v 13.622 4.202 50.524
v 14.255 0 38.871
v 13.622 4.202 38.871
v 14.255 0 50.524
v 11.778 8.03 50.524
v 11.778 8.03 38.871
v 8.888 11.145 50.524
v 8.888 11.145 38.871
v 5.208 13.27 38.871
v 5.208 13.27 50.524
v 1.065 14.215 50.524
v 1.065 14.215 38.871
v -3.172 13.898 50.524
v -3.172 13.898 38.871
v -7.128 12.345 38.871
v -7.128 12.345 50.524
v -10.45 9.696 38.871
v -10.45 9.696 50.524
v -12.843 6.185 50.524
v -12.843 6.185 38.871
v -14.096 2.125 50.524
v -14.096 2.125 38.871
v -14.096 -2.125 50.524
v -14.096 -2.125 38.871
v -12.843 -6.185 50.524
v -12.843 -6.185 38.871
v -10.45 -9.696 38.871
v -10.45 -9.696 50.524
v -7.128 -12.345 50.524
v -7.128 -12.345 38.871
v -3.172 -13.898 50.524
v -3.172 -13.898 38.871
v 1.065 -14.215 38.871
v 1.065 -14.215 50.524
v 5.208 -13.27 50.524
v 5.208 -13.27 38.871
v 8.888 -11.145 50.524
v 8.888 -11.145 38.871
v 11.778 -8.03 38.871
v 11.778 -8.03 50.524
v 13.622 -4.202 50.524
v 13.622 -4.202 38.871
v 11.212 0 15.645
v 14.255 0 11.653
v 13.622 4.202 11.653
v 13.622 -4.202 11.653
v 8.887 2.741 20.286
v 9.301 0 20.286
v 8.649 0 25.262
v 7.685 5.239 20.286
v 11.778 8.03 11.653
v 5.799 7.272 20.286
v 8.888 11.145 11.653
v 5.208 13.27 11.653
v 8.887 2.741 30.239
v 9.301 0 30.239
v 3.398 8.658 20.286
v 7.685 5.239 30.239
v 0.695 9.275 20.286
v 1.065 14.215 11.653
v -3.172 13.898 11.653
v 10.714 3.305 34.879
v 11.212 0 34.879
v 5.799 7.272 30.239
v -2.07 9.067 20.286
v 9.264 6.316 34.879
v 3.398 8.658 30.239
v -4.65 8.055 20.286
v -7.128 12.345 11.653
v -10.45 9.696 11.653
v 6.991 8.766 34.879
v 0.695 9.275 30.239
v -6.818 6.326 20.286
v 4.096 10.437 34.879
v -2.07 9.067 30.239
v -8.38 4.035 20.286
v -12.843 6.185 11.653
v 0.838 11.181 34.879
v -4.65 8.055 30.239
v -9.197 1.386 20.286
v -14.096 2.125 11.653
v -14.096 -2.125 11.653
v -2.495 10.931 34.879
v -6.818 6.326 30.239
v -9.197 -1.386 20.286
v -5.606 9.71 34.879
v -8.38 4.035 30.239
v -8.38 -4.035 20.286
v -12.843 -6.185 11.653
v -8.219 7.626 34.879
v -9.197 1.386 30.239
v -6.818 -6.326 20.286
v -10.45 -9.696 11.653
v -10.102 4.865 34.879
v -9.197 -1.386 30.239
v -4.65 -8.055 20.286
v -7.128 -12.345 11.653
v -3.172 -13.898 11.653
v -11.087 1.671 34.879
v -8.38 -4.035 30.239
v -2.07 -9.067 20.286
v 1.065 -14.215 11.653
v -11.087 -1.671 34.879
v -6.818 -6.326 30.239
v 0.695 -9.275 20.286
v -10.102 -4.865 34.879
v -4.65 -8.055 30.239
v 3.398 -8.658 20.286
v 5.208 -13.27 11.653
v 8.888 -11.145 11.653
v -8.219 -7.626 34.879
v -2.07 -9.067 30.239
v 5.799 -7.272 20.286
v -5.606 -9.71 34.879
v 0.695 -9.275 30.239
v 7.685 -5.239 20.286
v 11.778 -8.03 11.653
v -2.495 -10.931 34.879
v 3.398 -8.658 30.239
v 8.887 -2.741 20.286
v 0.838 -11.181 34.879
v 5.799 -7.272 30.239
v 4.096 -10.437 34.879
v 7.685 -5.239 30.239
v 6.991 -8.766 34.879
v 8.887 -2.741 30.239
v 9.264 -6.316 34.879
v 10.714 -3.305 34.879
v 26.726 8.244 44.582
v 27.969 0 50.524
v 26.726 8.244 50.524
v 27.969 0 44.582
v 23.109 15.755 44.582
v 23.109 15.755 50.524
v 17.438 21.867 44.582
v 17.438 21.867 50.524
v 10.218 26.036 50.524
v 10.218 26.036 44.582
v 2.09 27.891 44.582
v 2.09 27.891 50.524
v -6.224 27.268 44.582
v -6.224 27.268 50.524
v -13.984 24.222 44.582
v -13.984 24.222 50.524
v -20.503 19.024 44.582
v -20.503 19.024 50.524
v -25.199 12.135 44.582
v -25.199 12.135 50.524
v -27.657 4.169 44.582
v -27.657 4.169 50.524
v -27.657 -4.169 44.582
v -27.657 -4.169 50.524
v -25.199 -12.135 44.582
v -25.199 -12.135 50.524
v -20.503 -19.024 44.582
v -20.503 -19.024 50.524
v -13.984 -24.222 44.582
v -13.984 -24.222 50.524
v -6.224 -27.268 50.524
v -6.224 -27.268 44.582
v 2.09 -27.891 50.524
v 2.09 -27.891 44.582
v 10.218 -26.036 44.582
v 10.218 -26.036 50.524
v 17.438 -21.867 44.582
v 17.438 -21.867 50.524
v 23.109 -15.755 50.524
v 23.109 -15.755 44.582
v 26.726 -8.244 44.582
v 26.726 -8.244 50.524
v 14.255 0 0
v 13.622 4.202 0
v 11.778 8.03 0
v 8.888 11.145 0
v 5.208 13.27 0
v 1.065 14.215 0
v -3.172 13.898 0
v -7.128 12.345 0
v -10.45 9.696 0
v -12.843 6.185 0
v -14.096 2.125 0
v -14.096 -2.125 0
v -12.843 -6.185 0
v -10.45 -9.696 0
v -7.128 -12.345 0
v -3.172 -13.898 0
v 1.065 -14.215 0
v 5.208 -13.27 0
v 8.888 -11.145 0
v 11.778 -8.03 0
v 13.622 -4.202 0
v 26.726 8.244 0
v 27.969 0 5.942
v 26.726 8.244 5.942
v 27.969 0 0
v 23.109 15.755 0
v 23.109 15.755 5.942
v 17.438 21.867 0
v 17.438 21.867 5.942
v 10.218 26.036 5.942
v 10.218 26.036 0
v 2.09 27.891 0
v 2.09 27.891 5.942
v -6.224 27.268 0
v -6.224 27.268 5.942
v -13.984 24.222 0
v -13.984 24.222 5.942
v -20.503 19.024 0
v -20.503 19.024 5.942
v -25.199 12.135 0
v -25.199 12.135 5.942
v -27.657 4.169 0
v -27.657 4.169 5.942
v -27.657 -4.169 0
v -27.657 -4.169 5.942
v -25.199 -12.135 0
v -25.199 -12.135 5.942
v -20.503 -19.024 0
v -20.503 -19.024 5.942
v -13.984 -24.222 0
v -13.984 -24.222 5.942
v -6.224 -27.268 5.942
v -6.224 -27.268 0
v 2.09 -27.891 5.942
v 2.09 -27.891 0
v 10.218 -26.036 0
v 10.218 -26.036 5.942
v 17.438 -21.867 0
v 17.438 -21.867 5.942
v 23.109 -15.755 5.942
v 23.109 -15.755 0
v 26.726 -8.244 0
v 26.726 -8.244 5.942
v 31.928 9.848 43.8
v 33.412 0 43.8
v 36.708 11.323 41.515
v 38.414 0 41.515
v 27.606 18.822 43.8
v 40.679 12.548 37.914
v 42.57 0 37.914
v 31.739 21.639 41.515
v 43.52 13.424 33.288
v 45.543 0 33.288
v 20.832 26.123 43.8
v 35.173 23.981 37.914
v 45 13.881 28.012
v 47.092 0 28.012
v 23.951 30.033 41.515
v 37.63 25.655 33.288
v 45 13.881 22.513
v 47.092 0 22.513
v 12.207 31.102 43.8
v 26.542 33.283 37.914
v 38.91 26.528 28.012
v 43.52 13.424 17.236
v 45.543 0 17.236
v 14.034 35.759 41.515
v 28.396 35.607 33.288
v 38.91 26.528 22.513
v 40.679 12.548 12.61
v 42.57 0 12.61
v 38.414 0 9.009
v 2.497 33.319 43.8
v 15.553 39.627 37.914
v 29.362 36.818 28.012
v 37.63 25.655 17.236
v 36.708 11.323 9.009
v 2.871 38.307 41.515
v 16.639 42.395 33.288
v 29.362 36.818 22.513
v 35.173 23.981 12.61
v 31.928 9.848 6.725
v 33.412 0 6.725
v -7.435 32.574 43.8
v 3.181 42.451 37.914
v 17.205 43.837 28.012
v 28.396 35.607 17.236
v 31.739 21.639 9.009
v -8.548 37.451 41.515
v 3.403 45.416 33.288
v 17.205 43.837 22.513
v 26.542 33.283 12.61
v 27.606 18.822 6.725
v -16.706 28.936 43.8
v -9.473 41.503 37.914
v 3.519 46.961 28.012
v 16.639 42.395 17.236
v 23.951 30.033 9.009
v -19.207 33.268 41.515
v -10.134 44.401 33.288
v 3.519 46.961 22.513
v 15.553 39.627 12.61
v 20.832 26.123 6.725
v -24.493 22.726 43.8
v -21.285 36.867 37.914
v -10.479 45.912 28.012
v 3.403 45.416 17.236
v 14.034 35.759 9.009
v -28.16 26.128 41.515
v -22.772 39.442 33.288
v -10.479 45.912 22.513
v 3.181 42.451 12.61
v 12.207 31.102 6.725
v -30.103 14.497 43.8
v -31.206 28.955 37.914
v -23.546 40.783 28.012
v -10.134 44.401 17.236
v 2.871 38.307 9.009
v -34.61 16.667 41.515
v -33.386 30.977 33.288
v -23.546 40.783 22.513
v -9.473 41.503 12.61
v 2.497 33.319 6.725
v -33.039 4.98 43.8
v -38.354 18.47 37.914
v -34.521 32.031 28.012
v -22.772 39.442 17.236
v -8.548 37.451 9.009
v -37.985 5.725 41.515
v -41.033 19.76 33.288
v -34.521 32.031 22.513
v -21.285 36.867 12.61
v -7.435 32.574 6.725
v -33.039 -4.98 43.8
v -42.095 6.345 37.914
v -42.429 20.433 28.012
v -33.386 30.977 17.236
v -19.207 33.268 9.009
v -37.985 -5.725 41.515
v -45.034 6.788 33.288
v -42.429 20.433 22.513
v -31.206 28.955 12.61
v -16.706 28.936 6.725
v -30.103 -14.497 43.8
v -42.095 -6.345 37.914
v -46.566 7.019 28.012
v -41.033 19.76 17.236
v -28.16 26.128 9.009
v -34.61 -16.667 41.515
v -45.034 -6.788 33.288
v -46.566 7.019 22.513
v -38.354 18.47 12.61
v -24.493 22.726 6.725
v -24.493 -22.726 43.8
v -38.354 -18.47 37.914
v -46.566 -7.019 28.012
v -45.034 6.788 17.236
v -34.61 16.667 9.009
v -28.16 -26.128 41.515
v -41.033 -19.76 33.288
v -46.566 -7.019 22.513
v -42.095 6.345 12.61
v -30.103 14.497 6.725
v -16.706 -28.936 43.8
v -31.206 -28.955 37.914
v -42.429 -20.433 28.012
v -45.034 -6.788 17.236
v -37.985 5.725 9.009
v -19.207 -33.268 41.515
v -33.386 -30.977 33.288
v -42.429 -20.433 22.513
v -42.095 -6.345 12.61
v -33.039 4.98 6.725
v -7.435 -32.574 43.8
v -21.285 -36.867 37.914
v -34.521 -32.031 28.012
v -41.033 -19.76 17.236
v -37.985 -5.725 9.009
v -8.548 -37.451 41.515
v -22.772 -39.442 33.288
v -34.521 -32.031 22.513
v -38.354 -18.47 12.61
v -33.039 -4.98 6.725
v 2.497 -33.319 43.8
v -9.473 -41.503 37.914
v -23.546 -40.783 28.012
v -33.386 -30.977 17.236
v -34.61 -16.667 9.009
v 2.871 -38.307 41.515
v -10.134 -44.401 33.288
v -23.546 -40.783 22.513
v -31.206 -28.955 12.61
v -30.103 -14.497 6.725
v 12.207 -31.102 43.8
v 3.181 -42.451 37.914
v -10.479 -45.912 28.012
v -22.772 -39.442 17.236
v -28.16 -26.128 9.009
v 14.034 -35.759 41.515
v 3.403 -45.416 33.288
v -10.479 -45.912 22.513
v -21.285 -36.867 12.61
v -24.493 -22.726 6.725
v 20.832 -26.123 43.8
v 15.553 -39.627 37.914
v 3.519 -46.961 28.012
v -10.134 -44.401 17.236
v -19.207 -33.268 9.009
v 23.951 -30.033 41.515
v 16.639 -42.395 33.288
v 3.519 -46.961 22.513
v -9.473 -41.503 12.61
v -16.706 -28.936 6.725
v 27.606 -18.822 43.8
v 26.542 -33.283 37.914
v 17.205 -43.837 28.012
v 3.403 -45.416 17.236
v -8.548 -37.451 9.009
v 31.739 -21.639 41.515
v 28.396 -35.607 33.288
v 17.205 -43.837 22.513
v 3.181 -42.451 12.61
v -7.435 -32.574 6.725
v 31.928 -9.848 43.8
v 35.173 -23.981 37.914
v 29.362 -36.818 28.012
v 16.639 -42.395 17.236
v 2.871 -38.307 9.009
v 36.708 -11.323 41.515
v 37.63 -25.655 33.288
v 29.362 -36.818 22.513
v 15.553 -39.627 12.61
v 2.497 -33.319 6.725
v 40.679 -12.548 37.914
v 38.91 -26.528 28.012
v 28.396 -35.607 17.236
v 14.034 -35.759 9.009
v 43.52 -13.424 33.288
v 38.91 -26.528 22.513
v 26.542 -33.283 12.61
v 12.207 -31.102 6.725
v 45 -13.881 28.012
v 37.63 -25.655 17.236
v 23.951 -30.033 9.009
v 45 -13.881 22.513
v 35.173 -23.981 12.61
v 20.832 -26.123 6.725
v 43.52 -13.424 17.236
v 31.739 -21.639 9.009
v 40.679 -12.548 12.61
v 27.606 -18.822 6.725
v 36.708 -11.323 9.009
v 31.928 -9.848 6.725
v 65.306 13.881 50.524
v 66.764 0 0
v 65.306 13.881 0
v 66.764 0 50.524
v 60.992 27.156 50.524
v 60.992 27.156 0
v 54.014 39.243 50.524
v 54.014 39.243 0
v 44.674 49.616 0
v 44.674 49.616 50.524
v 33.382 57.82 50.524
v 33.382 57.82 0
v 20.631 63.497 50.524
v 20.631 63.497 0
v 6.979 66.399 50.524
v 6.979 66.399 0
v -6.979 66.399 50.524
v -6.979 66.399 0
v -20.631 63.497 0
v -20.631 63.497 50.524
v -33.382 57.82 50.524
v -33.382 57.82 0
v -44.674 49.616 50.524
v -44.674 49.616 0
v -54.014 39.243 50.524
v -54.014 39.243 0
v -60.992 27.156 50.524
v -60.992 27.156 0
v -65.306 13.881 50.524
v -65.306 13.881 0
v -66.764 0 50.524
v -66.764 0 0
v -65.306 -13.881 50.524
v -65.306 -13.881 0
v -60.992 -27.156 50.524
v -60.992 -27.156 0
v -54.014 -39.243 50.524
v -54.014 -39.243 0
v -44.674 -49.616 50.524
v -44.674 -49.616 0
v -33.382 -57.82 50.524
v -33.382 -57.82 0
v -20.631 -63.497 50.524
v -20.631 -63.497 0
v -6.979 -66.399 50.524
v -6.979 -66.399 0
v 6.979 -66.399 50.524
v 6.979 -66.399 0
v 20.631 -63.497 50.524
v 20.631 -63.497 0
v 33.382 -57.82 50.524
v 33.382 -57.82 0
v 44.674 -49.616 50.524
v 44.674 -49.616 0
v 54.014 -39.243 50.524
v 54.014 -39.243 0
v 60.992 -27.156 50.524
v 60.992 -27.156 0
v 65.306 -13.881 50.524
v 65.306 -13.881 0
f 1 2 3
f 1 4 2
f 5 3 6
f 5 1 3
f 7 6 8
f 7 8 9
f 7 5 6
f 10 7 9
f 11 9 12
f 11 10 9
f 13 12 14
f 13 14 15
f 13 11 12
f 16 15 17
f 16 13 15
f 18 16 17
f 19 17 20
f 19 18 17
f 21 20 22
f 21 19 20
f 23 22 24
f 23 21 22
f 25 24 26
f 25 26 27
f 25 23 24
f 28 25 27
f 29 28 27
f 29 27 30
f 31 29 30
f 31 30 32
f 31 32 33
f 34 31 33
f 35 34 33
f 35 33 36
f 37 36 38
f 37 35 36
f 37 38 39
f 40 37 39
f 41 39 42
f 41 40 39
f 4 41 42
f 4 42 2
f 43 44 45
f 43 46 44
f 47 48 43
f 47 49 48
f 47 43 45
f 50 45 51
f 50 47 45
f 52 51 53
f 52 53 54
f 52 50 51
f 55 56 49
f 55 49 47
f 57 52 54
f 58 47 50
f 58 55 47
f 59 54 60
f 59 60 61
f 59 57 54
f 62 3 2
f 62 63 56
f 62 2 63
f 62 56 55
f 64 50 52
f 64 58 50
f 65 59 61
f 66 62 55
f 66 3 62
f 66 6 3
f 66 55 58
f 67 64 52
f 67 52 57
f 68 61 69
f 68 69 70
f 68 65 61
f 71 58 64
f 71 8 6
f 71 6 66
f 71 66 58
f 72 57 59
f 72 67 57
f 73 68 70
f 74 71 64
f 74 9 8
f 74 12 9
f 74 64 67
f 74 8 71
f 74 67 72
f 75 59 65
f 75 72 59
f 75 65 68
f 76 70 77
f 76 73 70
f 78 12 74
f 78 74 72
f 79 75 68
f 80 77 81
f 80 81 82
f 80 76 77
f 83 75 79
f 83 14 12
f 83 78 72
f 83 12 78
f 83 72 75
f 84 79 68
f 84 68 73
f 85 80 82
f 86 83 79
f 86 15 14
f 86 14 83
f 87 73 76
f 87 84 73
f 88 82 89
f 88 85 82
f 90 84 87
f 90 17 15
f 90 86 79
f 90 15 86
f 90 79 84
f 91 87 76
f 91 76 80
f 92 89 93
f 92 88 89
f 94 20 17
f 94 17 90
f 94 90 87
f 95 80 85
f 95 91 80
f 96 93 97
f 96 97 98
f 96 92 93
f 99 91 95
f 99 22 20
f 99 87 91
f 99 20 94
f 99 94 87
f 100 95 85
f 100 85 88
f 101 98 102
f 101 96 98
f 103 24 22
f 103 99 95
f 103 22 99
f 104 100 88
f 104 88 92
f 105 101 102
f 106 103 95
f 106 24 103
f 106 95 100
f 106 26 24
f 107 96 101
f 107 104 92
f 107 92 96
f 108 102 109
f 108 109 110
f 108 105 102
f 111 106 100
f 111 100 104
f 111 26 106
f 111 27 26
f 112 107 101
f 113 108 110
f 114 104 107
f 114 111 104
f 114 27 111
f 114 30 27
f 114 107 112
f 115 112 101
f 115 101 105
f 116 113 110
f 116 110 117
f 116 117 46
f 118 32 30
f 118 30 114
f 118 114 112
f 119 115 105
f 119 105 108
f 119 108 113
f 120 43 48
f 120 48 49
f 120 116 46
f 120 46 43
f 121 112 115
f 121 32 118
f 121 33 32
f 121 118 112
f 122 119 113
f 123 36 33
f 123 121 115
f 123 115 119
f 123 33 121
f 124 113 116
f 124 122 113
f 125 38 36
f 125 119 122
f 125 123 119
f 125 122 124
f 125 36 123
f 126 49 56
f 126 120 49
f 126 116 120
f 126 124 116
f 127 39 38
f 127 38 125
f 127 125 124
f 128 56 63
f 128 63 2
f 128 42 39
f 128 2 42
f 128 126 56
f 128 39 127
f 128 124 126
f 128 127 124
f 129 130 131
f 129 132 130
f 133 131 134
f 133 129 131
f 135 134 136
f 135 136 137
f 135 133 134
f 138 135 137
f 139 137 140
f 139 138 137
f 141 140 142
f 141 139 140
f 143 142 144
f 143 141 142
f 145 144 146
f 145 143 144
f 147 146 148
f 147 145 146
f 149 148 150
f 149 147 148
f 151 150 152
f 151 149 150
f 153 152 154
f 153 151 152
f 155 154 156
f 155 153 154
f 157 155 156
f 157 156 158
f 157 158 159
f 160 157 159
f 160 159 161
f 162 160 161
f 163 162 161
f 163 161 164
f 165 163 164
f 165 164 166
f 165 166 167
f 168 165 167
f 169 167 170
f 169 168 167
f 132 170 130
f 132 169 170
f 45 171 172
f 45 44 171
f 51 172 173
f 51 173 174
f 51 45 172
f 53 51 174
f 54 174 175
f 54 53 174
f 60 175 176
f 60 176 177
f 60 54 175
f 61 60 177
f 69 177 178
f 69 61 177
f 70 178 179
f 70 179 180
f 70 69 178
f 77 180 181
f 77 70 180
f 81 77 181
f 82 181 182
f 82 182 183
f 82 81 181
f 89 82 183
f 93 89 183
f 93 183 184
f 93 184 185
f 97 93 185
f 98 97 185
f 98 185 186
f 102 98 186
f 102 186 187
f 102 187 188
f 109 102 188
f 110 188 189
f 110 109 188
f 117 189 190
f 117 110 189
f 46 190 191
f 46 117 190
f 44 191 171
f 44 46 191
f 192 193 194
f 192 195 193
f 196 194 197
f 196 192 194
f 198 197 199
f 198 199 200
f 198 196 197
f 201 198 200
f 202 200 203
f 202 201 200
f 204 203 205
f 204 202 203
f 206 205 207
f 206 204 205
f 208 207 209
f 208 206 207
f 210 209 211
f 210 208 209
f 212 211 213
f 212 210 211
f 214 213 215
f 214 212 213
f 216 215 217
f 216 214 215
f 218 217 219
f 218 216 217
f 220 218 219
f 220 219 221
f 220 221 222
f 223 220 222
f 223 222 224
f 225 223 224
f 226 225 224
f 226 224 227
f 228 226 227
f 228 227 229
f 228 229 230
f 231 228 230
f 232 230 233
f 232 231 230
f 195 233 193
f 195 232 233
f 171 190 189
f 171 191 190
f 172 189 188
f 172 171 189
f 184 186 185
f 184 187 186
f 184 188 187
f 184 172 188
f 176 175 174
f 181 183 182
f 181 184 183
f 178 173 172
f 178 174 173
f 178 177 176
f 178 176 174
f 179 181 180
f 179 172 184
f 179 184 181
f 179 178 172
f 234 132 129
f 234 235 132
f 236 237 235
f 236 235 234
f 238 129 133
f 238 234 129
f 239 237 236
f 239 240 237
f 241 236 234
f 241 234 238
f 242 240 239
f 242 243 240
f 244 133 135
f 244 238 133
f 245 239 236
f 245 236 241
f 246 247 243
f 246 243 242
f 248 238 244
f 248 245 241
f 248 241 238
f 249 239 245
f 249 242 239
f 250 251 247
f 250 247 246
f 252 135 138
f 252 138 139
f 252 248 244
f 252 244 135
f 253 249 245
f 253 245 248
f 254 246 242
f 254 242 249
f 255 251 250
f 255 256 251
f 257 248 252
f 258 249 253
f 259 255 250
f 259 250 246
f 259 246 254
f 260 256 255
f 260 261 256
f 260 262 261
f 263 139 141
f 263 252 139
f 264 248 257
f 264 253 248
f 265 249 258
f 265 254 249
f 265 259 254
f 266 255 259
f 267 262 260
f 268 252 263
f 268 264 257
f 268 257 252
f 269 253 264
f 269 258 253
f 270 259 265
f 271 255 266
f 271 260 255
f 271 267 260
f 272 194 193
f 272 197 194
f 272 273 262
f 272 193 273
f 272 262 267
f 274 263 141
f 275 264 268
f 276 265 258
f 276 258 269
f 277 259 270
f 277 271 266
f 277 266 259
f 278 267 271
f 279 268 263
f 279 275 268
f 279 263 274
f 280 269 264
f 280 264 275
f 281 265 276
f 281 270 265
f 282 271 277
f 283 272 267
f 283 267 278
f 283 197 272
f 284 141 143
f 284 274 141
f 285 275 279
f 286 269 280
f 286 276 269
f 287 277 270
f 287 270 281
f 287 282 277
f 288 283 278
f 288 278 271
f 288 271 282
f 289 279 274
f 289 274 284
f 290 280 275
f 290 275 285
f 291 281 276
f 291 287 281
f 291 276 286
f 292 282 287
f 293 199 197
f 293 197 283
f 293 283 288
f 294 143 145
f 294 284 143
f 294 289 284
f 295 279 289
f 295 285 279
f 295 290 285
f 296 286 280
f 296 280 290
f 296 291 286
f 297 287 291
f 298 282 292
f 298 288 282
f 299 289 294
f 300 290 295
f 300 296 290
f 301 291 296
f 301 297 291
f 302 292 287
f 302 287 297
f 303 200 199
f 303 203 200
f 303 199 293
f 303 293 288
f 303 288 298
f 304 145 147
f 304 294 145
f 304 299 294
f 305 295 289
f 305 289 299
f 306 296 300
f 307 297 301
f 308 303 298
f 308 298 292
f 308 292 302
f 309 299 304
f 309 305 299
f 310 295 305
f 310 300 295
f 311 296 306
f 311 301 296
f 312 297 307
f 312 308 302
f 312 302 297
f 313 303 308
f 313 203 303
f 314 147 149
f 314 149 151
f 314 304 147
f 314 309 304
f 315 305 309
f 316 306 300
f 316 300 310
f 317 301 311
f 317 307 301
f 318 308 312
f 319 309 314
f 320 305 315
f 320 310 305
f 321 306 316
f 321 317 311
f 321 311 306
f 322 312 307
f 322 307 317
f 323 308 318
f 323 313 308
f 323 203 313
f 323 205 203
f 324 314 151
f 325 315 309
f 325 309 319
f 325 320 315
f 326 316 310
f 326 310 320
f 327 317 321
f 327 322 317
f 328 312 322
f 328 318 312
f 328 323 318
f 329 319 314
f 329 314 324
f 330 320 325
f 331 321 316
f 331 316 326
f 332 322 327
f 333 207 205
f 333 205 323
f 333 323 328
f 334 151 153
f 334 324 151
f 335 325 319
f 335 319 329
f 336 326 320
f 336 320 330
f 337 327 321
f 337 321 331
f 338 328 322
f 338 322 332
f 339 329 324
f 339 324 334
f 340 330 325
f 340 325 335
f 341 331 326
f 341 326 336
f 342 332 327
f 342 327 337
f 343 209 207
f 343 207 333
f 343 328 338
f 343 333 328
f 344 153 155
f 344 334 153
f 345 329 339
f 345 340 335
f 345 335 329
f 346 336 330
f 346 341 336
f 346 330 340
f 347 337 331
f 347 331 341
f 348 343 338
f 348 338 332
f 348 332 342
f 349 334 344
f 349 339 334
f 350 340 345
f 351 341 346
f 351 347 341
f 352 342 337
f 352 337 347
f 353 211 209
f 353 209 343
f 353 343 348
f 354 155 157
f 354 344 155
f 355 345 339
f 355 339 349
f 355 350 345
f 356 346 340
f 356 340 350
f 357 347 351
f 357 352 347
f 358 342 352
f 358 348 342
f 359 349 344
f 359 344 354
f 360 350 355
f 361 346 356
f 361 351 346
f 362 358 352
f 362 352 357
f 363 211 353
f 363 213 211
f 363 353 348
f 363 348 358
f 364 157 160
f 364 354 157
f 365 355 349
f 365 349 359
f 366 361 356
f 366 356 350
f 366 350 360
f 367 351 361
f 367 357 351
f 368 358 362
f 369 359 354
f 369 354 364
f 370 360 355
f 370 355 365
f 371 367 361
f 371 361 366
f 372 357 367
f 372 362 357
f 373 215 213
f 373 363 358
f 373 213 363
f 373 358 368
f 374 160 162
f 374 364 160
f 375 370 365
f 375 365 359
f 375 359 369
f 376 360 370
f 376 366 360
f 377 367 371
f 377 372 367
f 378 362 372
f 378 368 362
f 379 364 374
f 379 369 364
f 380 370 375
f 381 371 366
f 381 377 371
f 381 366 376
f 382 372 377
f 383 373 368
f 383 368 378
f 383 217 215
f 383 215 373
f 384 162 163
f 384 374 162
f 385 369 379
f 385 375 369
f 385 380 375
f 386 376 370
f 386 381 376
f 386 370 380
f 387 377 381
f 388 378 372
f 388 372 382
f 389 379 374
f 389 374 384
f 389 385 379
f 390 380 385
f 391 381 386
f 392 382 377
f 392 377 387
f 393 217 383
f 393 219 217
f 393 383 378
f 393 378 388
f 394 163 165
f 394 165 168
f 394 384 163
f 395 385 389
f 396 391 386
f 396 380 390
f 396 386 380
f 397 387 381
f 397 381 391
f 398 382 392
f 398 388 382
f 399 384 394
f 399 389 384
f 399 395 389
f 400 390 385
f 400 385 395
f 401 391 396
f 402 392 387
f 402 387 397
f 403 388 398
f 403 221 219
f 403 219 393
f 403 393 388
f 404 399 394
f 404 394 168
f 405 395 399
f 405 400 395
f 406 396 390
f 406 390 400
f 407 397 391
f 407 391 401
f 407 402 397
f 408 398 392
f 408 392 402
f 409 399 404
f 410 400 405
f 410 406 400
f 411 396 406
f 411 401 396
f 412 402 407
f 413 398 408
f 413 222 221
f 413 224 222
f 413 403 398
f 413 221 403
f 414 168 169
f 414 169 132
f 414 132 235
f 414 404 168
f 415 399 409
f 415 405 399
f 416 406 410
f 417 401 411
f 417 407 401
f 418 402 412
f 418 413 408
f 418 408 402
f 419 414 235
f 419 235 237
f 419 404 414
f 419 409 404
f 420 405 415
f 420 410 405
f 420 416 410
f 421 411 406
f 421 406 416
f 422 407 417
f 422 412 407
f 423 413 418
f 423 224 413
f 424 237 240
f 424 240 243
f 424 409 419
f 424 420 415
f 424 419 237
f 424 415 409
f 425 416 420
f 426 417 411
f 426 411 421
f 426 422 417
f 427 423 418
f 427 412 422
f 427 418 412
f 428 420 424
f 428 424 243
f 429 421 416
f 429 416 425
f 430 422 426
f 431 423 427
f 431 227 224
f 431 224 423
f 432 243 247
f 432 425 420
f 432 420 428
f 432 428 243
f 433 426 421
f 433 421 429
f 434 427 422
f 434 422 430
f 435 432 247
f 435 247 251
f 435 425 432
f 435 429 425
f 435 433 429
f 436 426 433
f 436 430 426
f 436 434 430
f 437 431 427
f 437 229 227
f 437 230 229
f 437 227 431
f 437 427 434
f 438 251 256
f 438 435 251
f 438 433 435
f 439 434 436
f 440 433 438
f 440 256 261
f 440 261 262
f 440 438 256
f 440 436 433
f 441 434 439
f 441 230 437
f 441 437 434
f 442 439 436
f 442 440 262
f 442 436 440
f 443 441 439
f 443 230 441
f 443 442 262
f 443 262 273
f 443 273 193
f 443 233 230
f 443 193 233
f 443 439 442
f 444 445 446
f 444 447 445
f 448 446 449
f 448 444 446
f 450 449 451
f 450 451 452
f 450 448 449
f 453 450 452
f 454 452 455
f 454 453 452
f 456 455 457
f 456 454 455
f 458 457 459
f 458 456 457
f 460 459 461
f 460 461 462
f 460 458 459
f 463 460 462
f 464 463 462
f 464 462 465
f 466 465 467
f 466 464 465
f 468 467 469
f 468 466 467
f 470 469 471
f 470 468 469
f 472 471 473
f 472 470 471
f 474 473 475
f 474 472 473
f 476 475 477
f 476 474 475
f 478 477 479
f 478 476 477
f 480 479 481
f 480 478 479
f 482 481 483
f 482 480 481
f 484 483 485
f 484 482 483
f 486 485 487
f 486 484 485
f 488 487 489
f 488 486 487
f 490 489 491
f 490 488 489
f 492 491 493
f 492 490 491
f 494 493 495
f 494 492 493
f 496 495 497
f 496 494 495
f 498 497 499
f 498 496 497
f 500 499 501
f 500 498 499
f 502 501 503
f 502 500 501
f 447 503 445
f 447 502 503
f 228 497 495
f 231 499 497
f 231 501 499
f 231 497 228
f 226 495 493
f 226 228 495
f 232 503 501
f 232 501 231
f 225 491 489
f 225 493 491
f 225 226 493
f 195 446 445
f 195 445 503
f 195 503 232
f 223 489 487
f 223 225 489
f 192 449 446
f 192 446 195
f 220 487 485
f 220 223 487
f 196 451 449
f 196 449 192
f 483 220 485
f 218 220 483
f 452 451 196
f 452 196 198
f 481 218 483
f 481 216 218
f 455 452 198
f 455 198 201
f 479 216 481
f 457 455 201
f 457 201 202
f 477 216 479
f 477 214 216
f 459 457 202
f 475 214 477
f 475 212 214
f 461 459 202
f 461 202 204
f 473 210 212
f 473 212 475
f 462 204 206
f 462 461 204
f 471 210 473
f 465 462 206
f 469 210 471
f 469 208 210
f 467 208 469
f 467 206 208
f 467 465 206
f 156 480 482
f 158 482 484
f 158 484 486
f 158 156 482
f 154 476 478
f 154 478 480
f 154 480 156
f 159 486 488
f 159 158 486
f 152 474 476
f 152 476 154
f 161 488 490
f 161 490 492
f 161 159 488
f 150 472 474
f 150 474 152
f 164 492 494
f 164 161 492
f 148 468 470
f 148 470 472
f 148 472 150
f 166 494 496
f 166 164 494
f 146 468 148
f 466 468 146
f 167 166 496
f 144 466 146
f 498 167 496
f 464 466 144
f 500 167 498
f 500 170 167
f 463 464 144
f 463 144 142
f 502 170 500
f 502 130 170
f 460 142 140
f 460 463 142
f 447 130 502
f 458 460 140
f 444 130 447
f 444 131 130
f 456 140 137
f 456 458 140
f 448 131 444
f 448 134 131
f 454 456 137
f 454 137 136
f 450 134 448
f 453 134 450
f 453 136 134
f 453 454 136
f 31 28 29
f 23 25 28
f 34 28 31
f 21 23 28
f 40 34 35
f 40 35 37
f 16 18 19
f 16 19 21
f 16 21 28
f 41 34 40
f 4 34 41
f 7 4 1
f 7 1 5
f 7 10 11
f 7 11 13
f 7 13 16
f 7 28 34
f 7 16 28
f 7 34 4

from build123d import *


with BuildPart() as f1:
    # F0 (on Front) → F1 (revolve)
    with BuildSketch(Plane.XZ):
        with BuildLine():
            Line((0, 50.524443), (0, 0))
            Line((0, 0), (14.255121, 0))
            Line((14.255121, 0), (14.255121, 11.653305))
            ThreePointArc((14.255121, 11.653305), (8.648694, 25.262222), (14.255121, 38.871138))
            Line((14.255121, 38.871138), (14.255121, 50.524443))
            Line((14.255121, 50.524443), (0, 50.524443))
        make_face()
        with BuildLine():
            Line((66.764474, 0), (66.764474, 50.524443))
            Line((66.764474, 50.524443), (27.968898, 50.524443))
            Line((27.968898, 50.524443), (27.968898, 44.582426))
            ThreePointArc((27.968898, 44.582426), (47.289103, 25.262222), (27.968898, 5.942017))
            Line((27.968898, 5.942017), (27.968898, 0))
            Line((27.968898, 0), (66.764474, 0))
        make_face()
    revolve(axis=Axis((0, 0, 25.262222), (0, 0, 1)))


solid = f1.part
